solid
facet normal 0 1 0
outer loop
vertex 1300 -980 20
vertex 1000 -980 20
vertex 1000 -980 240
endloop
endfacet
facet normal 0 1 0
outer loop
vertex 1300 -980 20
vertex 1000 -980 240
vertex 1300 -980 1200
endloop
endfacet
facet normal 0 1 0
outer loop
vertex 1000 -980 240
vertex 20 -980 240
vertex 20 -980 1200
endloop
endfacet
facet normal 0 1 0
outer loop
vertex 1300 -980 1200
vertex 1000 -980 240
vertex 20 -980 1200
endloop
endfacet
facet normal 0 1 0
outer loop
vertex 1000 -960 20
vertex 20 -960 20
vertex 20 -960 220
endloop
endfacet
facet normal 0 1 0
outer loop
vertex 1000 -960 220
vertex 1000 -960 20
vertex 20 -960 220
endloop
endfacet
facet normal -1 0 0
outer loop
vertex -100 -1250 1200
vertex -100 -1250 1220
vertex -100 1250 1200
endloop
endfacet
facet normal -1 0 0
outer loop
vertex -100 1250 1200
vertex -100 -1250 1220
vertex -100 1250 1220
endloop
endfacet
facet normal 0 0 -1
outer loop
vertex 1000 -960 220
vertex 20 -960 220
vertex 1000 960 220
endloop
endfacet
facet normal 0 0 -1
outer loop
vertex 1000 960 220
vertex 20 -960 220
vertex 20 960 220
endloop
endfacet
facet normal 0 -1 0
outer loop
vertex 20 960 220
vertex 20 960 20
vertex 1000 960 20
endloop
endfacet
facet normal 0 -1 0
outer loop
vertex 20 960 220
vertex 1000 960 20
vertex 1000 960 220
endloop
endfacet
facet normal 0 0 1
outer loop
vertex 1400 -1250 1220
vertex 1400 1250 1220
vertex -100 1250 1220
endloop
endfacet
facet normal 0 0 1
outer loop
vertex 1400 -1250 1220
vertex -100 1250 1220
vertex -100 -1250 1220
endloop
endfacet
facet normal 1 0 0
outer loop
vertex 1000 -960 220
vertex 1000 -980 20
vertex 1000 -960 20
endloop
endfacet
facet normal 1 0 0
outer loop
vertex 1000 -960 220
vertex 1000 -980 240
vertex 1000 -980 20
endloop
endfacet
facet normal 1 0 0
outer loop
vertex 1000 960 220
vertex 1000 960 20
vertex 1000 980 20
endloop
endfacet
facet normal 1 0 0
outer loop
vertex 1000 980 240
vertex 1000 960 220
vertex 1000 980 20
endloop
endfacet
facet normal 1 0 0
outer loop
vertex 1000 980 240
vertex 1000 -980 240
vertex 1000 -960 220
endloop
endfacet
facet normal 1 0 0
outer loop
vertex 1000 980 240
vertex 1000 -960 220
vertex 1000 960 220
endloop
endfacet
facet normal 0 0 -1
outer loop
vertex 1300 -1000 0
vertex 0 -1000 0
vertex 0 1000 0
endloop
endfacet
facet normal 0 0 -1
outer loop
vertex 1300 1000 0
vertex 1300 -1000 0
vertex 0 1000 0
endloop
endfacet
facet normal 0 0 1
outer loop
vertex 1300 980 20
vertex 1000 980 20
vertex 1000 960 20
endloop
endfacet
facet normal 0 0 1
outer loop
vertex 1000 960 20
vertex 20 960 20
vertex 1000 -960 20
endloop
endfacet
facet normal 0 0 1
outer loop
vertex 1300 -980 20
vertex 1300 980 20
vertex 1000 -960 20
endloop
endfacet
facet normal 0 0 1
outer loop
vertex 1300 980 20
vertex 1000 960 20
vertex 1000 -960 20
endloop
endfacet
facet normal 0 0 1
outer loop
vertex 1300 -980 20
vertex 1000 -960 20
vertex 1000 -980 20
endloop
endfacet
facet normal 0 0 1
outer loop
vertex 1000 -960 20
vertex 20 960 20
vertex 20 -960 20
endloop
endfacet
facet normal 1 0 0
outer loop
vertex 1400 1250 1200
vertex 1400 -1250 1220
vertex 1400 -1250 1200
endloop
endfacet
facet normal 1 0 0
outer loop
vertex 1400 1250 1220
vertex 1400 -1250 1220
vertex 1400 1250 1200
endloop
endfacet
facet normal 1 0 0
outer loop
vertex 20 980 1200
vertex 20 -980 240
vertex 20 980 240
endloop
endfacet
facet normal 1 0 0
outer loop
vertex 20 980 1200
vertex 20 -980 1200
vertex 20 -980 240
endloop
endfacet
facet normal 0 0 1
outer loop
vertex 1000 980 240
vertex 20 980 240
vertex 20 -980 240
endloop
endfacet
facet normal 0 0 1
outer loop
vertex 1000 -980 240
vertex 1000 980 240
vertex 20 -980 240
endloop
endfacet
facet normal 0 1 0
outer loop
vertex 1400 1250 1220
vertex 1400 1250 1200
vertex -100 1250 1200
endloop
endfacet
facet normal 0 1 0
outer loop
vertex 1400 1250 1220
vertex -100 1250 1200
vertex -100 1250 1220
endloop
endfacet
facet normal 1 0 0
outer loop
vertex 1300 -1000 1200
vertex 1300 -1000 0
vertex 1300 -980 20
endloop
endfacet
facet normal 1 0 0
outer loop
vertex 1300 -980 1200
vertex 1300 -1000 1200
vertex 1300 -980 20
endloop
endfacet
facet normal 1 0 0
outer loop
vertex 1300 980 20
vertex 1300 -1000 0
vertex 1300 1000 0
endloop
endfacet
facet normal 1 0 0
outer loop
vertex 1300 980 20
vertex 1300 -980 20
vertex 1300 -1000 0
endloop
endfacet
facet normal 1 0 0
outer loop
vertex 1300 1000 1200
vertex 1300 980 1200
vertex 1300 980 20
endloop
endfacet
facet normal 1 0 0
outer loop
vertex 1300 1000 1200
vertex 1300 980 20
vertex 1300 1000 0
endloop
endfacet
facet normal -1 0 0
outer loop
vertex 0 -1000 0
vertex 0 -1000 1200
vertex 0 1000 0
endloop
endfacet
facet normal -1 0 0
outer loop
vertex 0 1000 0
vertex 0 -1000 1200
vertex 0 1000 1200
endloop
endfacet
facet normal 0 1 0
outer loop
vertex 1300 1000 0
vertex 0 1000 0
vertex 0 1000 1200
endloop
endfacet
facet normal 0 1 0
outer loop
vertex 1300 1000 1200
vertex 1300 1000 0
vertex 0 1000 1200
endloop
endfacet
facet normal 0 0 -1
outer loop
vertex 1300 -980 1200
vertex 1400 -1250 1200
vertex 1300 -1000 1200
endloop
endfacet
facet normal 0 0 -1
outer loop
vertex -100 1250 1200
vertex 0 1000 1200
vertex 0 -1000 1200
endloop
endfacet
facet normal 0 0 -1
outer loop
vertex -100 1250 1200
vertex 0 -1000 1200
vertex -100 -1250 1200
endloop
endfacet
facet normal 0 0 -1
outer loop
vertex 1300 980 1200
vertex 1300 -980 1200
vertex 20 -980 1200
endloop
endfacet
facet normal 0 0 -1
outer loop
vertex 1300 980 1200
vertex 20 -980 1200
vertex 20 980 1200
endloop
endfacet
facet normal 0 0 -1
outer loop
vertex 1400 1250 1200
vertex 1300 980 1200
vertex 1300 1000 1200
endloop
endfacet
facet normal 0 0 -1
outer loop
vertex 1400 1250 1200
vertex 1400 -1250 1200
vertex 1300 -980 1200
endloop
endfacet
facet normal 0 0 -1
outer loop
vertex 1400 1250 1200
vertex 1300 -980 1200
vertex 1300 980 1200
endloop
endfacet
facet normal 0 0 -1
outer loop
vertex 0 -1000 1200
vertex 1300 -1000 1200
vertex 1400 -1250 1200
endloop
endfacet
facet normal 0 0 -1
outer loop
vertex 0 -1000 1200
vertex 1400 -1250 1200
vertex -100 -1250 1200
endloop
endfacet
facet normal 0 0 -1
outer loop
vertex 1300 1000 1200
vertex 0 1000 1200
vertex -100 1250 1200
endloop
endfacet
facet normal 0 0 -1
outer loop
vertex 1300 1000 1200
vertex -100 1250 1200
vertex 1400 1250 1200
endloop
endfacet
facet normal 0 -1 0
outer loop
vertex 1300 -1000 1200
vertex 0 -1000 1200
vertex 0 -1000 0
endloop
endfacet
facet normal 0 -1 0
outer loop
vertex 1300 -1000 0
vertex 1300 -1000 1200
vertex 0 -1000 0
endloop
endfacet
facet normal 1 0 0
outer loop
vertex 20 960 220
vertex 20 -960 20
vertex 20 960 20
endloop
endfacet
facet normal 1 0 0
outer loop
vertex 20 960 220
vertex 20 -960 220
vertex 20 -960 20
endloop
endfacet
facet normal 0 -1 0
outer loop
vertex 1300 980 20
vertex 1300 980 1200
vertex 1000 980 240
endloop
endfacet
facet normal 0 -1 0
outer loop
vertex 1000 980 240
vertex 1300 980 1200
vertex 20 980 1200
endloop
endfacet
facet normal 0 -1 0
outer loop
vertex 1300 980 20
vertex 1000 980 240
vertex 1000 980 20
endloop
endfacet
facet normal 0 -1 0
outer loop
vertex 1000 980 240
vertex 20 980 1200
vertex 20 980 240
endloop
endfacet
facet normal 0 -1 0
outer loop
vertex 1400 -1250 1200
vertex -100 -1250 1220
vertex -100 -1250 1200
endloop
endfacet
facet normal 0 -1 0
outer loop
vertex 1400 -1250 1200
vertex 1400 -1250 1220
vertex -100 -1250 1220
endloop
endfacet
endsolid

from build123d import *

# Parameters (mm, degrees)
F2_DEPTH      = 1300
F0_W          = 1920
F0_H          = 200
F0_W_2        = 1960
F0_H_2        = 960
F0_W_3        = 20
F3_DEPTH      = 20
F4_DEPTH      = 1000
F5_DEPTH      = 1400
F5_DEPTH_BACK = 100


with BuildPart() as f2:
    # F0 (on Right) → F2 (new body, through all)
    with BuildSketch(Plane.YZ):
        Polygon((-1000, 1200), (-1000, 0), (1000, 0), (1000, 1200), (980, 1200), (980, 240), (980, 220), (980, 20), (960, 20), (-960, 20), (-980, 20), (-980, 220), (-980, 240), (-980, 1200), align=None)
    extrude(amount=F2_DEPTH)

    # F0 (on Right) → F3 (join, through all)
    with BuildSketch(Plane.YZ):
        with Locations((0, 120)):
            Rectangle(F0_W, F0_H)
        with Locations((0, 720)):
            Rectangle(F0_W_2, F0_H_2)
        Polygon((980, 240), (-980, 240), (-980, 220), (-960, 220), (960, 220), (980, 220), align=None)
        with Locations((970, 120)):
            Rectangle(F0_W_3, F0_H)
        with Locations((-970, 120)):
            Rectangle(F0_W_3, F0_H)
    extrude(amount=F3_DEPTH)

    # F0 (on Right) → F4 (join, through all)
    with BuildSketch(Plane.YZ):
        with Locations((-970, 120)):
            Rectangle(F0_W_3, F0_H)
        Polygon((980, 240), (-980, 240), (-980, 220), (-960, 220), (960, 220), (980, 220), align=None)
        with Locations((970, 120)):
            Rectangle(F0_W_3, F0_H)
    extrude(amount=F4_DEPTH)

    # F0 (on Right) → F5 (join, two sides)
    with BuildSketch(Plane.YZ) as f5_sk:
        Polygon((-1250, 1200), (-1000, 1200), (-980, 1200), (980, 1200), (1000, 1200), (1250, 1200), (1250, 1220), (-1250, 1220), align=None)
    extrude(amount=F5_DEPTH)
    extrude(f5_sk.sketch, amount=-F5_DEPTH_BACK)


solid = f2.part
